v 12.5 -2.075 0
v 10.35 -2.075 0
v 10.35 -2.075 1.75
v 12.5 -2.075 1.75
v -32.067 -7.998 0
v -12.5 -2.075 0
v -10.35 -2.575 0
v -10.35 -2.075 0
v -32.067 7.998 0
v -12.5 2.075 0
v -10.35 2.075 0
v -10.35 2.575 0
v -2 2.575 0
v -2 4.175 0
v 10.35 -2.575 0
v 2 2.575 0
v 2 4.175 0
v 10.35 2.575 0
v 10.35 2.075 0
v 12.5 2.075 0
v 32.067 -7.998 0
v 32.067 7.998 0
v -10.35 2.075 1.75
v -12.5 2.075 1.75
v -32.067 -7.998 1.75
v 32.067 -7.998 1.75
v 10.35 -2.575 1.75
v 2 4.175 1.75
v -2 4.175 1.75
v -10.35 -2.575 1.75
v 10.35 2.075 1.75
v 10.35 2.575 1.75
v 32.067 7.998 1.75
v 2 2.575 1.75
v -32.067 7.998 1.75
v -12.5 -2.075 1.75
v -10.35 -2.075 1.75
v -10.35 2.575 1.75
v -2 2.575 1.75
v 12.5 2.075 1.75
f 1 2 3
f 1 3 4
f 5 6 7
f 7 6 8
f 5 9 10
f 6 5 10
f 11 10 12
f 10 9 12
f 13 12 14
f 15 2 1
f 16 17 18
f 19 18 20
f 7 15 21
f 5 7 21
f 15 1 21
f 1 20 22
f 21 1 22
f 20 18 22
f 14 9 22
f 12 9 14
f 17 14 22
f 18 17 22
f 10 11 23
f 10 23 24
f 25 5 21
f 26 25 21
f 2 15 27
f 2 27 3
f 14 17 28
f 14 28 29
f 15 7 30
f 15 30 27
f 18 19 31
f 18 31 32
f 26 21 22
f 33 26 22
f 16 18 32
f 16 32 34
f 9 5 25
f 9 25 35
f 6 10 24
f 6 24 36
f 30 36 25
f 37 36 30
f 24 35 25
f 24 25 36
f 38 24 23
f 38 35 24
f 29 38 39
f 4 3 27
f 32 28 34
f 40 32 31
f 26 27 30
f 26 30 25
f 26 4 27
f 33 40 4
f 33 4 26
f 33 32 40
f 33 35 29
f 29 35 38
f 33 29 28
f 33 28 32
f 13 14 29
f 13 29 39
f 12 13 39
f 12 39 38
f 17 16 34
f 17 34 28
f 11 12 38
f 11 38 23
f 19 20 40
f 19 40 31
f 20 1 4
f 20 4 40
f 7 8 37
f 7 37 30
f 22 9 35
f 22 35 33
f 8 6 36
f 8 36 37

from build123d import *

# Parameters (mm, degrees)
SKETCH1_W           = 64.133812
SKETCH1_H           = 15.995398686
BOSS_EXTRUDE1_DEPTH = 1.75


with BuildPart() as part:
    # Sketch1 → Boss-Extrude1 (new body)
    with BuildSketch(Plane.XY):
        Rectangle(SKETCH1_W, SKETCH1_H)
        Polygon((-12.5, -2.075), (-10.35, -2.075), (-10.35, -2.575), (10.35, -2.575), (10.35, -2.075), (12.5, -2.075), (12.5, 2.075), (10.35, 2.075), (10.35, 2.575), (2, 2.575), (2, 4.175), (-2, 4.175), (-2, 2.575), (-10.35, 2.575), (-10.35, 2.075), (-12.5, 2.075), align=None, mode=Mode.SUBTRACT)
    extrude(amount=BOSS_EXTRUDE1_DEPTH)


solid = part.part
